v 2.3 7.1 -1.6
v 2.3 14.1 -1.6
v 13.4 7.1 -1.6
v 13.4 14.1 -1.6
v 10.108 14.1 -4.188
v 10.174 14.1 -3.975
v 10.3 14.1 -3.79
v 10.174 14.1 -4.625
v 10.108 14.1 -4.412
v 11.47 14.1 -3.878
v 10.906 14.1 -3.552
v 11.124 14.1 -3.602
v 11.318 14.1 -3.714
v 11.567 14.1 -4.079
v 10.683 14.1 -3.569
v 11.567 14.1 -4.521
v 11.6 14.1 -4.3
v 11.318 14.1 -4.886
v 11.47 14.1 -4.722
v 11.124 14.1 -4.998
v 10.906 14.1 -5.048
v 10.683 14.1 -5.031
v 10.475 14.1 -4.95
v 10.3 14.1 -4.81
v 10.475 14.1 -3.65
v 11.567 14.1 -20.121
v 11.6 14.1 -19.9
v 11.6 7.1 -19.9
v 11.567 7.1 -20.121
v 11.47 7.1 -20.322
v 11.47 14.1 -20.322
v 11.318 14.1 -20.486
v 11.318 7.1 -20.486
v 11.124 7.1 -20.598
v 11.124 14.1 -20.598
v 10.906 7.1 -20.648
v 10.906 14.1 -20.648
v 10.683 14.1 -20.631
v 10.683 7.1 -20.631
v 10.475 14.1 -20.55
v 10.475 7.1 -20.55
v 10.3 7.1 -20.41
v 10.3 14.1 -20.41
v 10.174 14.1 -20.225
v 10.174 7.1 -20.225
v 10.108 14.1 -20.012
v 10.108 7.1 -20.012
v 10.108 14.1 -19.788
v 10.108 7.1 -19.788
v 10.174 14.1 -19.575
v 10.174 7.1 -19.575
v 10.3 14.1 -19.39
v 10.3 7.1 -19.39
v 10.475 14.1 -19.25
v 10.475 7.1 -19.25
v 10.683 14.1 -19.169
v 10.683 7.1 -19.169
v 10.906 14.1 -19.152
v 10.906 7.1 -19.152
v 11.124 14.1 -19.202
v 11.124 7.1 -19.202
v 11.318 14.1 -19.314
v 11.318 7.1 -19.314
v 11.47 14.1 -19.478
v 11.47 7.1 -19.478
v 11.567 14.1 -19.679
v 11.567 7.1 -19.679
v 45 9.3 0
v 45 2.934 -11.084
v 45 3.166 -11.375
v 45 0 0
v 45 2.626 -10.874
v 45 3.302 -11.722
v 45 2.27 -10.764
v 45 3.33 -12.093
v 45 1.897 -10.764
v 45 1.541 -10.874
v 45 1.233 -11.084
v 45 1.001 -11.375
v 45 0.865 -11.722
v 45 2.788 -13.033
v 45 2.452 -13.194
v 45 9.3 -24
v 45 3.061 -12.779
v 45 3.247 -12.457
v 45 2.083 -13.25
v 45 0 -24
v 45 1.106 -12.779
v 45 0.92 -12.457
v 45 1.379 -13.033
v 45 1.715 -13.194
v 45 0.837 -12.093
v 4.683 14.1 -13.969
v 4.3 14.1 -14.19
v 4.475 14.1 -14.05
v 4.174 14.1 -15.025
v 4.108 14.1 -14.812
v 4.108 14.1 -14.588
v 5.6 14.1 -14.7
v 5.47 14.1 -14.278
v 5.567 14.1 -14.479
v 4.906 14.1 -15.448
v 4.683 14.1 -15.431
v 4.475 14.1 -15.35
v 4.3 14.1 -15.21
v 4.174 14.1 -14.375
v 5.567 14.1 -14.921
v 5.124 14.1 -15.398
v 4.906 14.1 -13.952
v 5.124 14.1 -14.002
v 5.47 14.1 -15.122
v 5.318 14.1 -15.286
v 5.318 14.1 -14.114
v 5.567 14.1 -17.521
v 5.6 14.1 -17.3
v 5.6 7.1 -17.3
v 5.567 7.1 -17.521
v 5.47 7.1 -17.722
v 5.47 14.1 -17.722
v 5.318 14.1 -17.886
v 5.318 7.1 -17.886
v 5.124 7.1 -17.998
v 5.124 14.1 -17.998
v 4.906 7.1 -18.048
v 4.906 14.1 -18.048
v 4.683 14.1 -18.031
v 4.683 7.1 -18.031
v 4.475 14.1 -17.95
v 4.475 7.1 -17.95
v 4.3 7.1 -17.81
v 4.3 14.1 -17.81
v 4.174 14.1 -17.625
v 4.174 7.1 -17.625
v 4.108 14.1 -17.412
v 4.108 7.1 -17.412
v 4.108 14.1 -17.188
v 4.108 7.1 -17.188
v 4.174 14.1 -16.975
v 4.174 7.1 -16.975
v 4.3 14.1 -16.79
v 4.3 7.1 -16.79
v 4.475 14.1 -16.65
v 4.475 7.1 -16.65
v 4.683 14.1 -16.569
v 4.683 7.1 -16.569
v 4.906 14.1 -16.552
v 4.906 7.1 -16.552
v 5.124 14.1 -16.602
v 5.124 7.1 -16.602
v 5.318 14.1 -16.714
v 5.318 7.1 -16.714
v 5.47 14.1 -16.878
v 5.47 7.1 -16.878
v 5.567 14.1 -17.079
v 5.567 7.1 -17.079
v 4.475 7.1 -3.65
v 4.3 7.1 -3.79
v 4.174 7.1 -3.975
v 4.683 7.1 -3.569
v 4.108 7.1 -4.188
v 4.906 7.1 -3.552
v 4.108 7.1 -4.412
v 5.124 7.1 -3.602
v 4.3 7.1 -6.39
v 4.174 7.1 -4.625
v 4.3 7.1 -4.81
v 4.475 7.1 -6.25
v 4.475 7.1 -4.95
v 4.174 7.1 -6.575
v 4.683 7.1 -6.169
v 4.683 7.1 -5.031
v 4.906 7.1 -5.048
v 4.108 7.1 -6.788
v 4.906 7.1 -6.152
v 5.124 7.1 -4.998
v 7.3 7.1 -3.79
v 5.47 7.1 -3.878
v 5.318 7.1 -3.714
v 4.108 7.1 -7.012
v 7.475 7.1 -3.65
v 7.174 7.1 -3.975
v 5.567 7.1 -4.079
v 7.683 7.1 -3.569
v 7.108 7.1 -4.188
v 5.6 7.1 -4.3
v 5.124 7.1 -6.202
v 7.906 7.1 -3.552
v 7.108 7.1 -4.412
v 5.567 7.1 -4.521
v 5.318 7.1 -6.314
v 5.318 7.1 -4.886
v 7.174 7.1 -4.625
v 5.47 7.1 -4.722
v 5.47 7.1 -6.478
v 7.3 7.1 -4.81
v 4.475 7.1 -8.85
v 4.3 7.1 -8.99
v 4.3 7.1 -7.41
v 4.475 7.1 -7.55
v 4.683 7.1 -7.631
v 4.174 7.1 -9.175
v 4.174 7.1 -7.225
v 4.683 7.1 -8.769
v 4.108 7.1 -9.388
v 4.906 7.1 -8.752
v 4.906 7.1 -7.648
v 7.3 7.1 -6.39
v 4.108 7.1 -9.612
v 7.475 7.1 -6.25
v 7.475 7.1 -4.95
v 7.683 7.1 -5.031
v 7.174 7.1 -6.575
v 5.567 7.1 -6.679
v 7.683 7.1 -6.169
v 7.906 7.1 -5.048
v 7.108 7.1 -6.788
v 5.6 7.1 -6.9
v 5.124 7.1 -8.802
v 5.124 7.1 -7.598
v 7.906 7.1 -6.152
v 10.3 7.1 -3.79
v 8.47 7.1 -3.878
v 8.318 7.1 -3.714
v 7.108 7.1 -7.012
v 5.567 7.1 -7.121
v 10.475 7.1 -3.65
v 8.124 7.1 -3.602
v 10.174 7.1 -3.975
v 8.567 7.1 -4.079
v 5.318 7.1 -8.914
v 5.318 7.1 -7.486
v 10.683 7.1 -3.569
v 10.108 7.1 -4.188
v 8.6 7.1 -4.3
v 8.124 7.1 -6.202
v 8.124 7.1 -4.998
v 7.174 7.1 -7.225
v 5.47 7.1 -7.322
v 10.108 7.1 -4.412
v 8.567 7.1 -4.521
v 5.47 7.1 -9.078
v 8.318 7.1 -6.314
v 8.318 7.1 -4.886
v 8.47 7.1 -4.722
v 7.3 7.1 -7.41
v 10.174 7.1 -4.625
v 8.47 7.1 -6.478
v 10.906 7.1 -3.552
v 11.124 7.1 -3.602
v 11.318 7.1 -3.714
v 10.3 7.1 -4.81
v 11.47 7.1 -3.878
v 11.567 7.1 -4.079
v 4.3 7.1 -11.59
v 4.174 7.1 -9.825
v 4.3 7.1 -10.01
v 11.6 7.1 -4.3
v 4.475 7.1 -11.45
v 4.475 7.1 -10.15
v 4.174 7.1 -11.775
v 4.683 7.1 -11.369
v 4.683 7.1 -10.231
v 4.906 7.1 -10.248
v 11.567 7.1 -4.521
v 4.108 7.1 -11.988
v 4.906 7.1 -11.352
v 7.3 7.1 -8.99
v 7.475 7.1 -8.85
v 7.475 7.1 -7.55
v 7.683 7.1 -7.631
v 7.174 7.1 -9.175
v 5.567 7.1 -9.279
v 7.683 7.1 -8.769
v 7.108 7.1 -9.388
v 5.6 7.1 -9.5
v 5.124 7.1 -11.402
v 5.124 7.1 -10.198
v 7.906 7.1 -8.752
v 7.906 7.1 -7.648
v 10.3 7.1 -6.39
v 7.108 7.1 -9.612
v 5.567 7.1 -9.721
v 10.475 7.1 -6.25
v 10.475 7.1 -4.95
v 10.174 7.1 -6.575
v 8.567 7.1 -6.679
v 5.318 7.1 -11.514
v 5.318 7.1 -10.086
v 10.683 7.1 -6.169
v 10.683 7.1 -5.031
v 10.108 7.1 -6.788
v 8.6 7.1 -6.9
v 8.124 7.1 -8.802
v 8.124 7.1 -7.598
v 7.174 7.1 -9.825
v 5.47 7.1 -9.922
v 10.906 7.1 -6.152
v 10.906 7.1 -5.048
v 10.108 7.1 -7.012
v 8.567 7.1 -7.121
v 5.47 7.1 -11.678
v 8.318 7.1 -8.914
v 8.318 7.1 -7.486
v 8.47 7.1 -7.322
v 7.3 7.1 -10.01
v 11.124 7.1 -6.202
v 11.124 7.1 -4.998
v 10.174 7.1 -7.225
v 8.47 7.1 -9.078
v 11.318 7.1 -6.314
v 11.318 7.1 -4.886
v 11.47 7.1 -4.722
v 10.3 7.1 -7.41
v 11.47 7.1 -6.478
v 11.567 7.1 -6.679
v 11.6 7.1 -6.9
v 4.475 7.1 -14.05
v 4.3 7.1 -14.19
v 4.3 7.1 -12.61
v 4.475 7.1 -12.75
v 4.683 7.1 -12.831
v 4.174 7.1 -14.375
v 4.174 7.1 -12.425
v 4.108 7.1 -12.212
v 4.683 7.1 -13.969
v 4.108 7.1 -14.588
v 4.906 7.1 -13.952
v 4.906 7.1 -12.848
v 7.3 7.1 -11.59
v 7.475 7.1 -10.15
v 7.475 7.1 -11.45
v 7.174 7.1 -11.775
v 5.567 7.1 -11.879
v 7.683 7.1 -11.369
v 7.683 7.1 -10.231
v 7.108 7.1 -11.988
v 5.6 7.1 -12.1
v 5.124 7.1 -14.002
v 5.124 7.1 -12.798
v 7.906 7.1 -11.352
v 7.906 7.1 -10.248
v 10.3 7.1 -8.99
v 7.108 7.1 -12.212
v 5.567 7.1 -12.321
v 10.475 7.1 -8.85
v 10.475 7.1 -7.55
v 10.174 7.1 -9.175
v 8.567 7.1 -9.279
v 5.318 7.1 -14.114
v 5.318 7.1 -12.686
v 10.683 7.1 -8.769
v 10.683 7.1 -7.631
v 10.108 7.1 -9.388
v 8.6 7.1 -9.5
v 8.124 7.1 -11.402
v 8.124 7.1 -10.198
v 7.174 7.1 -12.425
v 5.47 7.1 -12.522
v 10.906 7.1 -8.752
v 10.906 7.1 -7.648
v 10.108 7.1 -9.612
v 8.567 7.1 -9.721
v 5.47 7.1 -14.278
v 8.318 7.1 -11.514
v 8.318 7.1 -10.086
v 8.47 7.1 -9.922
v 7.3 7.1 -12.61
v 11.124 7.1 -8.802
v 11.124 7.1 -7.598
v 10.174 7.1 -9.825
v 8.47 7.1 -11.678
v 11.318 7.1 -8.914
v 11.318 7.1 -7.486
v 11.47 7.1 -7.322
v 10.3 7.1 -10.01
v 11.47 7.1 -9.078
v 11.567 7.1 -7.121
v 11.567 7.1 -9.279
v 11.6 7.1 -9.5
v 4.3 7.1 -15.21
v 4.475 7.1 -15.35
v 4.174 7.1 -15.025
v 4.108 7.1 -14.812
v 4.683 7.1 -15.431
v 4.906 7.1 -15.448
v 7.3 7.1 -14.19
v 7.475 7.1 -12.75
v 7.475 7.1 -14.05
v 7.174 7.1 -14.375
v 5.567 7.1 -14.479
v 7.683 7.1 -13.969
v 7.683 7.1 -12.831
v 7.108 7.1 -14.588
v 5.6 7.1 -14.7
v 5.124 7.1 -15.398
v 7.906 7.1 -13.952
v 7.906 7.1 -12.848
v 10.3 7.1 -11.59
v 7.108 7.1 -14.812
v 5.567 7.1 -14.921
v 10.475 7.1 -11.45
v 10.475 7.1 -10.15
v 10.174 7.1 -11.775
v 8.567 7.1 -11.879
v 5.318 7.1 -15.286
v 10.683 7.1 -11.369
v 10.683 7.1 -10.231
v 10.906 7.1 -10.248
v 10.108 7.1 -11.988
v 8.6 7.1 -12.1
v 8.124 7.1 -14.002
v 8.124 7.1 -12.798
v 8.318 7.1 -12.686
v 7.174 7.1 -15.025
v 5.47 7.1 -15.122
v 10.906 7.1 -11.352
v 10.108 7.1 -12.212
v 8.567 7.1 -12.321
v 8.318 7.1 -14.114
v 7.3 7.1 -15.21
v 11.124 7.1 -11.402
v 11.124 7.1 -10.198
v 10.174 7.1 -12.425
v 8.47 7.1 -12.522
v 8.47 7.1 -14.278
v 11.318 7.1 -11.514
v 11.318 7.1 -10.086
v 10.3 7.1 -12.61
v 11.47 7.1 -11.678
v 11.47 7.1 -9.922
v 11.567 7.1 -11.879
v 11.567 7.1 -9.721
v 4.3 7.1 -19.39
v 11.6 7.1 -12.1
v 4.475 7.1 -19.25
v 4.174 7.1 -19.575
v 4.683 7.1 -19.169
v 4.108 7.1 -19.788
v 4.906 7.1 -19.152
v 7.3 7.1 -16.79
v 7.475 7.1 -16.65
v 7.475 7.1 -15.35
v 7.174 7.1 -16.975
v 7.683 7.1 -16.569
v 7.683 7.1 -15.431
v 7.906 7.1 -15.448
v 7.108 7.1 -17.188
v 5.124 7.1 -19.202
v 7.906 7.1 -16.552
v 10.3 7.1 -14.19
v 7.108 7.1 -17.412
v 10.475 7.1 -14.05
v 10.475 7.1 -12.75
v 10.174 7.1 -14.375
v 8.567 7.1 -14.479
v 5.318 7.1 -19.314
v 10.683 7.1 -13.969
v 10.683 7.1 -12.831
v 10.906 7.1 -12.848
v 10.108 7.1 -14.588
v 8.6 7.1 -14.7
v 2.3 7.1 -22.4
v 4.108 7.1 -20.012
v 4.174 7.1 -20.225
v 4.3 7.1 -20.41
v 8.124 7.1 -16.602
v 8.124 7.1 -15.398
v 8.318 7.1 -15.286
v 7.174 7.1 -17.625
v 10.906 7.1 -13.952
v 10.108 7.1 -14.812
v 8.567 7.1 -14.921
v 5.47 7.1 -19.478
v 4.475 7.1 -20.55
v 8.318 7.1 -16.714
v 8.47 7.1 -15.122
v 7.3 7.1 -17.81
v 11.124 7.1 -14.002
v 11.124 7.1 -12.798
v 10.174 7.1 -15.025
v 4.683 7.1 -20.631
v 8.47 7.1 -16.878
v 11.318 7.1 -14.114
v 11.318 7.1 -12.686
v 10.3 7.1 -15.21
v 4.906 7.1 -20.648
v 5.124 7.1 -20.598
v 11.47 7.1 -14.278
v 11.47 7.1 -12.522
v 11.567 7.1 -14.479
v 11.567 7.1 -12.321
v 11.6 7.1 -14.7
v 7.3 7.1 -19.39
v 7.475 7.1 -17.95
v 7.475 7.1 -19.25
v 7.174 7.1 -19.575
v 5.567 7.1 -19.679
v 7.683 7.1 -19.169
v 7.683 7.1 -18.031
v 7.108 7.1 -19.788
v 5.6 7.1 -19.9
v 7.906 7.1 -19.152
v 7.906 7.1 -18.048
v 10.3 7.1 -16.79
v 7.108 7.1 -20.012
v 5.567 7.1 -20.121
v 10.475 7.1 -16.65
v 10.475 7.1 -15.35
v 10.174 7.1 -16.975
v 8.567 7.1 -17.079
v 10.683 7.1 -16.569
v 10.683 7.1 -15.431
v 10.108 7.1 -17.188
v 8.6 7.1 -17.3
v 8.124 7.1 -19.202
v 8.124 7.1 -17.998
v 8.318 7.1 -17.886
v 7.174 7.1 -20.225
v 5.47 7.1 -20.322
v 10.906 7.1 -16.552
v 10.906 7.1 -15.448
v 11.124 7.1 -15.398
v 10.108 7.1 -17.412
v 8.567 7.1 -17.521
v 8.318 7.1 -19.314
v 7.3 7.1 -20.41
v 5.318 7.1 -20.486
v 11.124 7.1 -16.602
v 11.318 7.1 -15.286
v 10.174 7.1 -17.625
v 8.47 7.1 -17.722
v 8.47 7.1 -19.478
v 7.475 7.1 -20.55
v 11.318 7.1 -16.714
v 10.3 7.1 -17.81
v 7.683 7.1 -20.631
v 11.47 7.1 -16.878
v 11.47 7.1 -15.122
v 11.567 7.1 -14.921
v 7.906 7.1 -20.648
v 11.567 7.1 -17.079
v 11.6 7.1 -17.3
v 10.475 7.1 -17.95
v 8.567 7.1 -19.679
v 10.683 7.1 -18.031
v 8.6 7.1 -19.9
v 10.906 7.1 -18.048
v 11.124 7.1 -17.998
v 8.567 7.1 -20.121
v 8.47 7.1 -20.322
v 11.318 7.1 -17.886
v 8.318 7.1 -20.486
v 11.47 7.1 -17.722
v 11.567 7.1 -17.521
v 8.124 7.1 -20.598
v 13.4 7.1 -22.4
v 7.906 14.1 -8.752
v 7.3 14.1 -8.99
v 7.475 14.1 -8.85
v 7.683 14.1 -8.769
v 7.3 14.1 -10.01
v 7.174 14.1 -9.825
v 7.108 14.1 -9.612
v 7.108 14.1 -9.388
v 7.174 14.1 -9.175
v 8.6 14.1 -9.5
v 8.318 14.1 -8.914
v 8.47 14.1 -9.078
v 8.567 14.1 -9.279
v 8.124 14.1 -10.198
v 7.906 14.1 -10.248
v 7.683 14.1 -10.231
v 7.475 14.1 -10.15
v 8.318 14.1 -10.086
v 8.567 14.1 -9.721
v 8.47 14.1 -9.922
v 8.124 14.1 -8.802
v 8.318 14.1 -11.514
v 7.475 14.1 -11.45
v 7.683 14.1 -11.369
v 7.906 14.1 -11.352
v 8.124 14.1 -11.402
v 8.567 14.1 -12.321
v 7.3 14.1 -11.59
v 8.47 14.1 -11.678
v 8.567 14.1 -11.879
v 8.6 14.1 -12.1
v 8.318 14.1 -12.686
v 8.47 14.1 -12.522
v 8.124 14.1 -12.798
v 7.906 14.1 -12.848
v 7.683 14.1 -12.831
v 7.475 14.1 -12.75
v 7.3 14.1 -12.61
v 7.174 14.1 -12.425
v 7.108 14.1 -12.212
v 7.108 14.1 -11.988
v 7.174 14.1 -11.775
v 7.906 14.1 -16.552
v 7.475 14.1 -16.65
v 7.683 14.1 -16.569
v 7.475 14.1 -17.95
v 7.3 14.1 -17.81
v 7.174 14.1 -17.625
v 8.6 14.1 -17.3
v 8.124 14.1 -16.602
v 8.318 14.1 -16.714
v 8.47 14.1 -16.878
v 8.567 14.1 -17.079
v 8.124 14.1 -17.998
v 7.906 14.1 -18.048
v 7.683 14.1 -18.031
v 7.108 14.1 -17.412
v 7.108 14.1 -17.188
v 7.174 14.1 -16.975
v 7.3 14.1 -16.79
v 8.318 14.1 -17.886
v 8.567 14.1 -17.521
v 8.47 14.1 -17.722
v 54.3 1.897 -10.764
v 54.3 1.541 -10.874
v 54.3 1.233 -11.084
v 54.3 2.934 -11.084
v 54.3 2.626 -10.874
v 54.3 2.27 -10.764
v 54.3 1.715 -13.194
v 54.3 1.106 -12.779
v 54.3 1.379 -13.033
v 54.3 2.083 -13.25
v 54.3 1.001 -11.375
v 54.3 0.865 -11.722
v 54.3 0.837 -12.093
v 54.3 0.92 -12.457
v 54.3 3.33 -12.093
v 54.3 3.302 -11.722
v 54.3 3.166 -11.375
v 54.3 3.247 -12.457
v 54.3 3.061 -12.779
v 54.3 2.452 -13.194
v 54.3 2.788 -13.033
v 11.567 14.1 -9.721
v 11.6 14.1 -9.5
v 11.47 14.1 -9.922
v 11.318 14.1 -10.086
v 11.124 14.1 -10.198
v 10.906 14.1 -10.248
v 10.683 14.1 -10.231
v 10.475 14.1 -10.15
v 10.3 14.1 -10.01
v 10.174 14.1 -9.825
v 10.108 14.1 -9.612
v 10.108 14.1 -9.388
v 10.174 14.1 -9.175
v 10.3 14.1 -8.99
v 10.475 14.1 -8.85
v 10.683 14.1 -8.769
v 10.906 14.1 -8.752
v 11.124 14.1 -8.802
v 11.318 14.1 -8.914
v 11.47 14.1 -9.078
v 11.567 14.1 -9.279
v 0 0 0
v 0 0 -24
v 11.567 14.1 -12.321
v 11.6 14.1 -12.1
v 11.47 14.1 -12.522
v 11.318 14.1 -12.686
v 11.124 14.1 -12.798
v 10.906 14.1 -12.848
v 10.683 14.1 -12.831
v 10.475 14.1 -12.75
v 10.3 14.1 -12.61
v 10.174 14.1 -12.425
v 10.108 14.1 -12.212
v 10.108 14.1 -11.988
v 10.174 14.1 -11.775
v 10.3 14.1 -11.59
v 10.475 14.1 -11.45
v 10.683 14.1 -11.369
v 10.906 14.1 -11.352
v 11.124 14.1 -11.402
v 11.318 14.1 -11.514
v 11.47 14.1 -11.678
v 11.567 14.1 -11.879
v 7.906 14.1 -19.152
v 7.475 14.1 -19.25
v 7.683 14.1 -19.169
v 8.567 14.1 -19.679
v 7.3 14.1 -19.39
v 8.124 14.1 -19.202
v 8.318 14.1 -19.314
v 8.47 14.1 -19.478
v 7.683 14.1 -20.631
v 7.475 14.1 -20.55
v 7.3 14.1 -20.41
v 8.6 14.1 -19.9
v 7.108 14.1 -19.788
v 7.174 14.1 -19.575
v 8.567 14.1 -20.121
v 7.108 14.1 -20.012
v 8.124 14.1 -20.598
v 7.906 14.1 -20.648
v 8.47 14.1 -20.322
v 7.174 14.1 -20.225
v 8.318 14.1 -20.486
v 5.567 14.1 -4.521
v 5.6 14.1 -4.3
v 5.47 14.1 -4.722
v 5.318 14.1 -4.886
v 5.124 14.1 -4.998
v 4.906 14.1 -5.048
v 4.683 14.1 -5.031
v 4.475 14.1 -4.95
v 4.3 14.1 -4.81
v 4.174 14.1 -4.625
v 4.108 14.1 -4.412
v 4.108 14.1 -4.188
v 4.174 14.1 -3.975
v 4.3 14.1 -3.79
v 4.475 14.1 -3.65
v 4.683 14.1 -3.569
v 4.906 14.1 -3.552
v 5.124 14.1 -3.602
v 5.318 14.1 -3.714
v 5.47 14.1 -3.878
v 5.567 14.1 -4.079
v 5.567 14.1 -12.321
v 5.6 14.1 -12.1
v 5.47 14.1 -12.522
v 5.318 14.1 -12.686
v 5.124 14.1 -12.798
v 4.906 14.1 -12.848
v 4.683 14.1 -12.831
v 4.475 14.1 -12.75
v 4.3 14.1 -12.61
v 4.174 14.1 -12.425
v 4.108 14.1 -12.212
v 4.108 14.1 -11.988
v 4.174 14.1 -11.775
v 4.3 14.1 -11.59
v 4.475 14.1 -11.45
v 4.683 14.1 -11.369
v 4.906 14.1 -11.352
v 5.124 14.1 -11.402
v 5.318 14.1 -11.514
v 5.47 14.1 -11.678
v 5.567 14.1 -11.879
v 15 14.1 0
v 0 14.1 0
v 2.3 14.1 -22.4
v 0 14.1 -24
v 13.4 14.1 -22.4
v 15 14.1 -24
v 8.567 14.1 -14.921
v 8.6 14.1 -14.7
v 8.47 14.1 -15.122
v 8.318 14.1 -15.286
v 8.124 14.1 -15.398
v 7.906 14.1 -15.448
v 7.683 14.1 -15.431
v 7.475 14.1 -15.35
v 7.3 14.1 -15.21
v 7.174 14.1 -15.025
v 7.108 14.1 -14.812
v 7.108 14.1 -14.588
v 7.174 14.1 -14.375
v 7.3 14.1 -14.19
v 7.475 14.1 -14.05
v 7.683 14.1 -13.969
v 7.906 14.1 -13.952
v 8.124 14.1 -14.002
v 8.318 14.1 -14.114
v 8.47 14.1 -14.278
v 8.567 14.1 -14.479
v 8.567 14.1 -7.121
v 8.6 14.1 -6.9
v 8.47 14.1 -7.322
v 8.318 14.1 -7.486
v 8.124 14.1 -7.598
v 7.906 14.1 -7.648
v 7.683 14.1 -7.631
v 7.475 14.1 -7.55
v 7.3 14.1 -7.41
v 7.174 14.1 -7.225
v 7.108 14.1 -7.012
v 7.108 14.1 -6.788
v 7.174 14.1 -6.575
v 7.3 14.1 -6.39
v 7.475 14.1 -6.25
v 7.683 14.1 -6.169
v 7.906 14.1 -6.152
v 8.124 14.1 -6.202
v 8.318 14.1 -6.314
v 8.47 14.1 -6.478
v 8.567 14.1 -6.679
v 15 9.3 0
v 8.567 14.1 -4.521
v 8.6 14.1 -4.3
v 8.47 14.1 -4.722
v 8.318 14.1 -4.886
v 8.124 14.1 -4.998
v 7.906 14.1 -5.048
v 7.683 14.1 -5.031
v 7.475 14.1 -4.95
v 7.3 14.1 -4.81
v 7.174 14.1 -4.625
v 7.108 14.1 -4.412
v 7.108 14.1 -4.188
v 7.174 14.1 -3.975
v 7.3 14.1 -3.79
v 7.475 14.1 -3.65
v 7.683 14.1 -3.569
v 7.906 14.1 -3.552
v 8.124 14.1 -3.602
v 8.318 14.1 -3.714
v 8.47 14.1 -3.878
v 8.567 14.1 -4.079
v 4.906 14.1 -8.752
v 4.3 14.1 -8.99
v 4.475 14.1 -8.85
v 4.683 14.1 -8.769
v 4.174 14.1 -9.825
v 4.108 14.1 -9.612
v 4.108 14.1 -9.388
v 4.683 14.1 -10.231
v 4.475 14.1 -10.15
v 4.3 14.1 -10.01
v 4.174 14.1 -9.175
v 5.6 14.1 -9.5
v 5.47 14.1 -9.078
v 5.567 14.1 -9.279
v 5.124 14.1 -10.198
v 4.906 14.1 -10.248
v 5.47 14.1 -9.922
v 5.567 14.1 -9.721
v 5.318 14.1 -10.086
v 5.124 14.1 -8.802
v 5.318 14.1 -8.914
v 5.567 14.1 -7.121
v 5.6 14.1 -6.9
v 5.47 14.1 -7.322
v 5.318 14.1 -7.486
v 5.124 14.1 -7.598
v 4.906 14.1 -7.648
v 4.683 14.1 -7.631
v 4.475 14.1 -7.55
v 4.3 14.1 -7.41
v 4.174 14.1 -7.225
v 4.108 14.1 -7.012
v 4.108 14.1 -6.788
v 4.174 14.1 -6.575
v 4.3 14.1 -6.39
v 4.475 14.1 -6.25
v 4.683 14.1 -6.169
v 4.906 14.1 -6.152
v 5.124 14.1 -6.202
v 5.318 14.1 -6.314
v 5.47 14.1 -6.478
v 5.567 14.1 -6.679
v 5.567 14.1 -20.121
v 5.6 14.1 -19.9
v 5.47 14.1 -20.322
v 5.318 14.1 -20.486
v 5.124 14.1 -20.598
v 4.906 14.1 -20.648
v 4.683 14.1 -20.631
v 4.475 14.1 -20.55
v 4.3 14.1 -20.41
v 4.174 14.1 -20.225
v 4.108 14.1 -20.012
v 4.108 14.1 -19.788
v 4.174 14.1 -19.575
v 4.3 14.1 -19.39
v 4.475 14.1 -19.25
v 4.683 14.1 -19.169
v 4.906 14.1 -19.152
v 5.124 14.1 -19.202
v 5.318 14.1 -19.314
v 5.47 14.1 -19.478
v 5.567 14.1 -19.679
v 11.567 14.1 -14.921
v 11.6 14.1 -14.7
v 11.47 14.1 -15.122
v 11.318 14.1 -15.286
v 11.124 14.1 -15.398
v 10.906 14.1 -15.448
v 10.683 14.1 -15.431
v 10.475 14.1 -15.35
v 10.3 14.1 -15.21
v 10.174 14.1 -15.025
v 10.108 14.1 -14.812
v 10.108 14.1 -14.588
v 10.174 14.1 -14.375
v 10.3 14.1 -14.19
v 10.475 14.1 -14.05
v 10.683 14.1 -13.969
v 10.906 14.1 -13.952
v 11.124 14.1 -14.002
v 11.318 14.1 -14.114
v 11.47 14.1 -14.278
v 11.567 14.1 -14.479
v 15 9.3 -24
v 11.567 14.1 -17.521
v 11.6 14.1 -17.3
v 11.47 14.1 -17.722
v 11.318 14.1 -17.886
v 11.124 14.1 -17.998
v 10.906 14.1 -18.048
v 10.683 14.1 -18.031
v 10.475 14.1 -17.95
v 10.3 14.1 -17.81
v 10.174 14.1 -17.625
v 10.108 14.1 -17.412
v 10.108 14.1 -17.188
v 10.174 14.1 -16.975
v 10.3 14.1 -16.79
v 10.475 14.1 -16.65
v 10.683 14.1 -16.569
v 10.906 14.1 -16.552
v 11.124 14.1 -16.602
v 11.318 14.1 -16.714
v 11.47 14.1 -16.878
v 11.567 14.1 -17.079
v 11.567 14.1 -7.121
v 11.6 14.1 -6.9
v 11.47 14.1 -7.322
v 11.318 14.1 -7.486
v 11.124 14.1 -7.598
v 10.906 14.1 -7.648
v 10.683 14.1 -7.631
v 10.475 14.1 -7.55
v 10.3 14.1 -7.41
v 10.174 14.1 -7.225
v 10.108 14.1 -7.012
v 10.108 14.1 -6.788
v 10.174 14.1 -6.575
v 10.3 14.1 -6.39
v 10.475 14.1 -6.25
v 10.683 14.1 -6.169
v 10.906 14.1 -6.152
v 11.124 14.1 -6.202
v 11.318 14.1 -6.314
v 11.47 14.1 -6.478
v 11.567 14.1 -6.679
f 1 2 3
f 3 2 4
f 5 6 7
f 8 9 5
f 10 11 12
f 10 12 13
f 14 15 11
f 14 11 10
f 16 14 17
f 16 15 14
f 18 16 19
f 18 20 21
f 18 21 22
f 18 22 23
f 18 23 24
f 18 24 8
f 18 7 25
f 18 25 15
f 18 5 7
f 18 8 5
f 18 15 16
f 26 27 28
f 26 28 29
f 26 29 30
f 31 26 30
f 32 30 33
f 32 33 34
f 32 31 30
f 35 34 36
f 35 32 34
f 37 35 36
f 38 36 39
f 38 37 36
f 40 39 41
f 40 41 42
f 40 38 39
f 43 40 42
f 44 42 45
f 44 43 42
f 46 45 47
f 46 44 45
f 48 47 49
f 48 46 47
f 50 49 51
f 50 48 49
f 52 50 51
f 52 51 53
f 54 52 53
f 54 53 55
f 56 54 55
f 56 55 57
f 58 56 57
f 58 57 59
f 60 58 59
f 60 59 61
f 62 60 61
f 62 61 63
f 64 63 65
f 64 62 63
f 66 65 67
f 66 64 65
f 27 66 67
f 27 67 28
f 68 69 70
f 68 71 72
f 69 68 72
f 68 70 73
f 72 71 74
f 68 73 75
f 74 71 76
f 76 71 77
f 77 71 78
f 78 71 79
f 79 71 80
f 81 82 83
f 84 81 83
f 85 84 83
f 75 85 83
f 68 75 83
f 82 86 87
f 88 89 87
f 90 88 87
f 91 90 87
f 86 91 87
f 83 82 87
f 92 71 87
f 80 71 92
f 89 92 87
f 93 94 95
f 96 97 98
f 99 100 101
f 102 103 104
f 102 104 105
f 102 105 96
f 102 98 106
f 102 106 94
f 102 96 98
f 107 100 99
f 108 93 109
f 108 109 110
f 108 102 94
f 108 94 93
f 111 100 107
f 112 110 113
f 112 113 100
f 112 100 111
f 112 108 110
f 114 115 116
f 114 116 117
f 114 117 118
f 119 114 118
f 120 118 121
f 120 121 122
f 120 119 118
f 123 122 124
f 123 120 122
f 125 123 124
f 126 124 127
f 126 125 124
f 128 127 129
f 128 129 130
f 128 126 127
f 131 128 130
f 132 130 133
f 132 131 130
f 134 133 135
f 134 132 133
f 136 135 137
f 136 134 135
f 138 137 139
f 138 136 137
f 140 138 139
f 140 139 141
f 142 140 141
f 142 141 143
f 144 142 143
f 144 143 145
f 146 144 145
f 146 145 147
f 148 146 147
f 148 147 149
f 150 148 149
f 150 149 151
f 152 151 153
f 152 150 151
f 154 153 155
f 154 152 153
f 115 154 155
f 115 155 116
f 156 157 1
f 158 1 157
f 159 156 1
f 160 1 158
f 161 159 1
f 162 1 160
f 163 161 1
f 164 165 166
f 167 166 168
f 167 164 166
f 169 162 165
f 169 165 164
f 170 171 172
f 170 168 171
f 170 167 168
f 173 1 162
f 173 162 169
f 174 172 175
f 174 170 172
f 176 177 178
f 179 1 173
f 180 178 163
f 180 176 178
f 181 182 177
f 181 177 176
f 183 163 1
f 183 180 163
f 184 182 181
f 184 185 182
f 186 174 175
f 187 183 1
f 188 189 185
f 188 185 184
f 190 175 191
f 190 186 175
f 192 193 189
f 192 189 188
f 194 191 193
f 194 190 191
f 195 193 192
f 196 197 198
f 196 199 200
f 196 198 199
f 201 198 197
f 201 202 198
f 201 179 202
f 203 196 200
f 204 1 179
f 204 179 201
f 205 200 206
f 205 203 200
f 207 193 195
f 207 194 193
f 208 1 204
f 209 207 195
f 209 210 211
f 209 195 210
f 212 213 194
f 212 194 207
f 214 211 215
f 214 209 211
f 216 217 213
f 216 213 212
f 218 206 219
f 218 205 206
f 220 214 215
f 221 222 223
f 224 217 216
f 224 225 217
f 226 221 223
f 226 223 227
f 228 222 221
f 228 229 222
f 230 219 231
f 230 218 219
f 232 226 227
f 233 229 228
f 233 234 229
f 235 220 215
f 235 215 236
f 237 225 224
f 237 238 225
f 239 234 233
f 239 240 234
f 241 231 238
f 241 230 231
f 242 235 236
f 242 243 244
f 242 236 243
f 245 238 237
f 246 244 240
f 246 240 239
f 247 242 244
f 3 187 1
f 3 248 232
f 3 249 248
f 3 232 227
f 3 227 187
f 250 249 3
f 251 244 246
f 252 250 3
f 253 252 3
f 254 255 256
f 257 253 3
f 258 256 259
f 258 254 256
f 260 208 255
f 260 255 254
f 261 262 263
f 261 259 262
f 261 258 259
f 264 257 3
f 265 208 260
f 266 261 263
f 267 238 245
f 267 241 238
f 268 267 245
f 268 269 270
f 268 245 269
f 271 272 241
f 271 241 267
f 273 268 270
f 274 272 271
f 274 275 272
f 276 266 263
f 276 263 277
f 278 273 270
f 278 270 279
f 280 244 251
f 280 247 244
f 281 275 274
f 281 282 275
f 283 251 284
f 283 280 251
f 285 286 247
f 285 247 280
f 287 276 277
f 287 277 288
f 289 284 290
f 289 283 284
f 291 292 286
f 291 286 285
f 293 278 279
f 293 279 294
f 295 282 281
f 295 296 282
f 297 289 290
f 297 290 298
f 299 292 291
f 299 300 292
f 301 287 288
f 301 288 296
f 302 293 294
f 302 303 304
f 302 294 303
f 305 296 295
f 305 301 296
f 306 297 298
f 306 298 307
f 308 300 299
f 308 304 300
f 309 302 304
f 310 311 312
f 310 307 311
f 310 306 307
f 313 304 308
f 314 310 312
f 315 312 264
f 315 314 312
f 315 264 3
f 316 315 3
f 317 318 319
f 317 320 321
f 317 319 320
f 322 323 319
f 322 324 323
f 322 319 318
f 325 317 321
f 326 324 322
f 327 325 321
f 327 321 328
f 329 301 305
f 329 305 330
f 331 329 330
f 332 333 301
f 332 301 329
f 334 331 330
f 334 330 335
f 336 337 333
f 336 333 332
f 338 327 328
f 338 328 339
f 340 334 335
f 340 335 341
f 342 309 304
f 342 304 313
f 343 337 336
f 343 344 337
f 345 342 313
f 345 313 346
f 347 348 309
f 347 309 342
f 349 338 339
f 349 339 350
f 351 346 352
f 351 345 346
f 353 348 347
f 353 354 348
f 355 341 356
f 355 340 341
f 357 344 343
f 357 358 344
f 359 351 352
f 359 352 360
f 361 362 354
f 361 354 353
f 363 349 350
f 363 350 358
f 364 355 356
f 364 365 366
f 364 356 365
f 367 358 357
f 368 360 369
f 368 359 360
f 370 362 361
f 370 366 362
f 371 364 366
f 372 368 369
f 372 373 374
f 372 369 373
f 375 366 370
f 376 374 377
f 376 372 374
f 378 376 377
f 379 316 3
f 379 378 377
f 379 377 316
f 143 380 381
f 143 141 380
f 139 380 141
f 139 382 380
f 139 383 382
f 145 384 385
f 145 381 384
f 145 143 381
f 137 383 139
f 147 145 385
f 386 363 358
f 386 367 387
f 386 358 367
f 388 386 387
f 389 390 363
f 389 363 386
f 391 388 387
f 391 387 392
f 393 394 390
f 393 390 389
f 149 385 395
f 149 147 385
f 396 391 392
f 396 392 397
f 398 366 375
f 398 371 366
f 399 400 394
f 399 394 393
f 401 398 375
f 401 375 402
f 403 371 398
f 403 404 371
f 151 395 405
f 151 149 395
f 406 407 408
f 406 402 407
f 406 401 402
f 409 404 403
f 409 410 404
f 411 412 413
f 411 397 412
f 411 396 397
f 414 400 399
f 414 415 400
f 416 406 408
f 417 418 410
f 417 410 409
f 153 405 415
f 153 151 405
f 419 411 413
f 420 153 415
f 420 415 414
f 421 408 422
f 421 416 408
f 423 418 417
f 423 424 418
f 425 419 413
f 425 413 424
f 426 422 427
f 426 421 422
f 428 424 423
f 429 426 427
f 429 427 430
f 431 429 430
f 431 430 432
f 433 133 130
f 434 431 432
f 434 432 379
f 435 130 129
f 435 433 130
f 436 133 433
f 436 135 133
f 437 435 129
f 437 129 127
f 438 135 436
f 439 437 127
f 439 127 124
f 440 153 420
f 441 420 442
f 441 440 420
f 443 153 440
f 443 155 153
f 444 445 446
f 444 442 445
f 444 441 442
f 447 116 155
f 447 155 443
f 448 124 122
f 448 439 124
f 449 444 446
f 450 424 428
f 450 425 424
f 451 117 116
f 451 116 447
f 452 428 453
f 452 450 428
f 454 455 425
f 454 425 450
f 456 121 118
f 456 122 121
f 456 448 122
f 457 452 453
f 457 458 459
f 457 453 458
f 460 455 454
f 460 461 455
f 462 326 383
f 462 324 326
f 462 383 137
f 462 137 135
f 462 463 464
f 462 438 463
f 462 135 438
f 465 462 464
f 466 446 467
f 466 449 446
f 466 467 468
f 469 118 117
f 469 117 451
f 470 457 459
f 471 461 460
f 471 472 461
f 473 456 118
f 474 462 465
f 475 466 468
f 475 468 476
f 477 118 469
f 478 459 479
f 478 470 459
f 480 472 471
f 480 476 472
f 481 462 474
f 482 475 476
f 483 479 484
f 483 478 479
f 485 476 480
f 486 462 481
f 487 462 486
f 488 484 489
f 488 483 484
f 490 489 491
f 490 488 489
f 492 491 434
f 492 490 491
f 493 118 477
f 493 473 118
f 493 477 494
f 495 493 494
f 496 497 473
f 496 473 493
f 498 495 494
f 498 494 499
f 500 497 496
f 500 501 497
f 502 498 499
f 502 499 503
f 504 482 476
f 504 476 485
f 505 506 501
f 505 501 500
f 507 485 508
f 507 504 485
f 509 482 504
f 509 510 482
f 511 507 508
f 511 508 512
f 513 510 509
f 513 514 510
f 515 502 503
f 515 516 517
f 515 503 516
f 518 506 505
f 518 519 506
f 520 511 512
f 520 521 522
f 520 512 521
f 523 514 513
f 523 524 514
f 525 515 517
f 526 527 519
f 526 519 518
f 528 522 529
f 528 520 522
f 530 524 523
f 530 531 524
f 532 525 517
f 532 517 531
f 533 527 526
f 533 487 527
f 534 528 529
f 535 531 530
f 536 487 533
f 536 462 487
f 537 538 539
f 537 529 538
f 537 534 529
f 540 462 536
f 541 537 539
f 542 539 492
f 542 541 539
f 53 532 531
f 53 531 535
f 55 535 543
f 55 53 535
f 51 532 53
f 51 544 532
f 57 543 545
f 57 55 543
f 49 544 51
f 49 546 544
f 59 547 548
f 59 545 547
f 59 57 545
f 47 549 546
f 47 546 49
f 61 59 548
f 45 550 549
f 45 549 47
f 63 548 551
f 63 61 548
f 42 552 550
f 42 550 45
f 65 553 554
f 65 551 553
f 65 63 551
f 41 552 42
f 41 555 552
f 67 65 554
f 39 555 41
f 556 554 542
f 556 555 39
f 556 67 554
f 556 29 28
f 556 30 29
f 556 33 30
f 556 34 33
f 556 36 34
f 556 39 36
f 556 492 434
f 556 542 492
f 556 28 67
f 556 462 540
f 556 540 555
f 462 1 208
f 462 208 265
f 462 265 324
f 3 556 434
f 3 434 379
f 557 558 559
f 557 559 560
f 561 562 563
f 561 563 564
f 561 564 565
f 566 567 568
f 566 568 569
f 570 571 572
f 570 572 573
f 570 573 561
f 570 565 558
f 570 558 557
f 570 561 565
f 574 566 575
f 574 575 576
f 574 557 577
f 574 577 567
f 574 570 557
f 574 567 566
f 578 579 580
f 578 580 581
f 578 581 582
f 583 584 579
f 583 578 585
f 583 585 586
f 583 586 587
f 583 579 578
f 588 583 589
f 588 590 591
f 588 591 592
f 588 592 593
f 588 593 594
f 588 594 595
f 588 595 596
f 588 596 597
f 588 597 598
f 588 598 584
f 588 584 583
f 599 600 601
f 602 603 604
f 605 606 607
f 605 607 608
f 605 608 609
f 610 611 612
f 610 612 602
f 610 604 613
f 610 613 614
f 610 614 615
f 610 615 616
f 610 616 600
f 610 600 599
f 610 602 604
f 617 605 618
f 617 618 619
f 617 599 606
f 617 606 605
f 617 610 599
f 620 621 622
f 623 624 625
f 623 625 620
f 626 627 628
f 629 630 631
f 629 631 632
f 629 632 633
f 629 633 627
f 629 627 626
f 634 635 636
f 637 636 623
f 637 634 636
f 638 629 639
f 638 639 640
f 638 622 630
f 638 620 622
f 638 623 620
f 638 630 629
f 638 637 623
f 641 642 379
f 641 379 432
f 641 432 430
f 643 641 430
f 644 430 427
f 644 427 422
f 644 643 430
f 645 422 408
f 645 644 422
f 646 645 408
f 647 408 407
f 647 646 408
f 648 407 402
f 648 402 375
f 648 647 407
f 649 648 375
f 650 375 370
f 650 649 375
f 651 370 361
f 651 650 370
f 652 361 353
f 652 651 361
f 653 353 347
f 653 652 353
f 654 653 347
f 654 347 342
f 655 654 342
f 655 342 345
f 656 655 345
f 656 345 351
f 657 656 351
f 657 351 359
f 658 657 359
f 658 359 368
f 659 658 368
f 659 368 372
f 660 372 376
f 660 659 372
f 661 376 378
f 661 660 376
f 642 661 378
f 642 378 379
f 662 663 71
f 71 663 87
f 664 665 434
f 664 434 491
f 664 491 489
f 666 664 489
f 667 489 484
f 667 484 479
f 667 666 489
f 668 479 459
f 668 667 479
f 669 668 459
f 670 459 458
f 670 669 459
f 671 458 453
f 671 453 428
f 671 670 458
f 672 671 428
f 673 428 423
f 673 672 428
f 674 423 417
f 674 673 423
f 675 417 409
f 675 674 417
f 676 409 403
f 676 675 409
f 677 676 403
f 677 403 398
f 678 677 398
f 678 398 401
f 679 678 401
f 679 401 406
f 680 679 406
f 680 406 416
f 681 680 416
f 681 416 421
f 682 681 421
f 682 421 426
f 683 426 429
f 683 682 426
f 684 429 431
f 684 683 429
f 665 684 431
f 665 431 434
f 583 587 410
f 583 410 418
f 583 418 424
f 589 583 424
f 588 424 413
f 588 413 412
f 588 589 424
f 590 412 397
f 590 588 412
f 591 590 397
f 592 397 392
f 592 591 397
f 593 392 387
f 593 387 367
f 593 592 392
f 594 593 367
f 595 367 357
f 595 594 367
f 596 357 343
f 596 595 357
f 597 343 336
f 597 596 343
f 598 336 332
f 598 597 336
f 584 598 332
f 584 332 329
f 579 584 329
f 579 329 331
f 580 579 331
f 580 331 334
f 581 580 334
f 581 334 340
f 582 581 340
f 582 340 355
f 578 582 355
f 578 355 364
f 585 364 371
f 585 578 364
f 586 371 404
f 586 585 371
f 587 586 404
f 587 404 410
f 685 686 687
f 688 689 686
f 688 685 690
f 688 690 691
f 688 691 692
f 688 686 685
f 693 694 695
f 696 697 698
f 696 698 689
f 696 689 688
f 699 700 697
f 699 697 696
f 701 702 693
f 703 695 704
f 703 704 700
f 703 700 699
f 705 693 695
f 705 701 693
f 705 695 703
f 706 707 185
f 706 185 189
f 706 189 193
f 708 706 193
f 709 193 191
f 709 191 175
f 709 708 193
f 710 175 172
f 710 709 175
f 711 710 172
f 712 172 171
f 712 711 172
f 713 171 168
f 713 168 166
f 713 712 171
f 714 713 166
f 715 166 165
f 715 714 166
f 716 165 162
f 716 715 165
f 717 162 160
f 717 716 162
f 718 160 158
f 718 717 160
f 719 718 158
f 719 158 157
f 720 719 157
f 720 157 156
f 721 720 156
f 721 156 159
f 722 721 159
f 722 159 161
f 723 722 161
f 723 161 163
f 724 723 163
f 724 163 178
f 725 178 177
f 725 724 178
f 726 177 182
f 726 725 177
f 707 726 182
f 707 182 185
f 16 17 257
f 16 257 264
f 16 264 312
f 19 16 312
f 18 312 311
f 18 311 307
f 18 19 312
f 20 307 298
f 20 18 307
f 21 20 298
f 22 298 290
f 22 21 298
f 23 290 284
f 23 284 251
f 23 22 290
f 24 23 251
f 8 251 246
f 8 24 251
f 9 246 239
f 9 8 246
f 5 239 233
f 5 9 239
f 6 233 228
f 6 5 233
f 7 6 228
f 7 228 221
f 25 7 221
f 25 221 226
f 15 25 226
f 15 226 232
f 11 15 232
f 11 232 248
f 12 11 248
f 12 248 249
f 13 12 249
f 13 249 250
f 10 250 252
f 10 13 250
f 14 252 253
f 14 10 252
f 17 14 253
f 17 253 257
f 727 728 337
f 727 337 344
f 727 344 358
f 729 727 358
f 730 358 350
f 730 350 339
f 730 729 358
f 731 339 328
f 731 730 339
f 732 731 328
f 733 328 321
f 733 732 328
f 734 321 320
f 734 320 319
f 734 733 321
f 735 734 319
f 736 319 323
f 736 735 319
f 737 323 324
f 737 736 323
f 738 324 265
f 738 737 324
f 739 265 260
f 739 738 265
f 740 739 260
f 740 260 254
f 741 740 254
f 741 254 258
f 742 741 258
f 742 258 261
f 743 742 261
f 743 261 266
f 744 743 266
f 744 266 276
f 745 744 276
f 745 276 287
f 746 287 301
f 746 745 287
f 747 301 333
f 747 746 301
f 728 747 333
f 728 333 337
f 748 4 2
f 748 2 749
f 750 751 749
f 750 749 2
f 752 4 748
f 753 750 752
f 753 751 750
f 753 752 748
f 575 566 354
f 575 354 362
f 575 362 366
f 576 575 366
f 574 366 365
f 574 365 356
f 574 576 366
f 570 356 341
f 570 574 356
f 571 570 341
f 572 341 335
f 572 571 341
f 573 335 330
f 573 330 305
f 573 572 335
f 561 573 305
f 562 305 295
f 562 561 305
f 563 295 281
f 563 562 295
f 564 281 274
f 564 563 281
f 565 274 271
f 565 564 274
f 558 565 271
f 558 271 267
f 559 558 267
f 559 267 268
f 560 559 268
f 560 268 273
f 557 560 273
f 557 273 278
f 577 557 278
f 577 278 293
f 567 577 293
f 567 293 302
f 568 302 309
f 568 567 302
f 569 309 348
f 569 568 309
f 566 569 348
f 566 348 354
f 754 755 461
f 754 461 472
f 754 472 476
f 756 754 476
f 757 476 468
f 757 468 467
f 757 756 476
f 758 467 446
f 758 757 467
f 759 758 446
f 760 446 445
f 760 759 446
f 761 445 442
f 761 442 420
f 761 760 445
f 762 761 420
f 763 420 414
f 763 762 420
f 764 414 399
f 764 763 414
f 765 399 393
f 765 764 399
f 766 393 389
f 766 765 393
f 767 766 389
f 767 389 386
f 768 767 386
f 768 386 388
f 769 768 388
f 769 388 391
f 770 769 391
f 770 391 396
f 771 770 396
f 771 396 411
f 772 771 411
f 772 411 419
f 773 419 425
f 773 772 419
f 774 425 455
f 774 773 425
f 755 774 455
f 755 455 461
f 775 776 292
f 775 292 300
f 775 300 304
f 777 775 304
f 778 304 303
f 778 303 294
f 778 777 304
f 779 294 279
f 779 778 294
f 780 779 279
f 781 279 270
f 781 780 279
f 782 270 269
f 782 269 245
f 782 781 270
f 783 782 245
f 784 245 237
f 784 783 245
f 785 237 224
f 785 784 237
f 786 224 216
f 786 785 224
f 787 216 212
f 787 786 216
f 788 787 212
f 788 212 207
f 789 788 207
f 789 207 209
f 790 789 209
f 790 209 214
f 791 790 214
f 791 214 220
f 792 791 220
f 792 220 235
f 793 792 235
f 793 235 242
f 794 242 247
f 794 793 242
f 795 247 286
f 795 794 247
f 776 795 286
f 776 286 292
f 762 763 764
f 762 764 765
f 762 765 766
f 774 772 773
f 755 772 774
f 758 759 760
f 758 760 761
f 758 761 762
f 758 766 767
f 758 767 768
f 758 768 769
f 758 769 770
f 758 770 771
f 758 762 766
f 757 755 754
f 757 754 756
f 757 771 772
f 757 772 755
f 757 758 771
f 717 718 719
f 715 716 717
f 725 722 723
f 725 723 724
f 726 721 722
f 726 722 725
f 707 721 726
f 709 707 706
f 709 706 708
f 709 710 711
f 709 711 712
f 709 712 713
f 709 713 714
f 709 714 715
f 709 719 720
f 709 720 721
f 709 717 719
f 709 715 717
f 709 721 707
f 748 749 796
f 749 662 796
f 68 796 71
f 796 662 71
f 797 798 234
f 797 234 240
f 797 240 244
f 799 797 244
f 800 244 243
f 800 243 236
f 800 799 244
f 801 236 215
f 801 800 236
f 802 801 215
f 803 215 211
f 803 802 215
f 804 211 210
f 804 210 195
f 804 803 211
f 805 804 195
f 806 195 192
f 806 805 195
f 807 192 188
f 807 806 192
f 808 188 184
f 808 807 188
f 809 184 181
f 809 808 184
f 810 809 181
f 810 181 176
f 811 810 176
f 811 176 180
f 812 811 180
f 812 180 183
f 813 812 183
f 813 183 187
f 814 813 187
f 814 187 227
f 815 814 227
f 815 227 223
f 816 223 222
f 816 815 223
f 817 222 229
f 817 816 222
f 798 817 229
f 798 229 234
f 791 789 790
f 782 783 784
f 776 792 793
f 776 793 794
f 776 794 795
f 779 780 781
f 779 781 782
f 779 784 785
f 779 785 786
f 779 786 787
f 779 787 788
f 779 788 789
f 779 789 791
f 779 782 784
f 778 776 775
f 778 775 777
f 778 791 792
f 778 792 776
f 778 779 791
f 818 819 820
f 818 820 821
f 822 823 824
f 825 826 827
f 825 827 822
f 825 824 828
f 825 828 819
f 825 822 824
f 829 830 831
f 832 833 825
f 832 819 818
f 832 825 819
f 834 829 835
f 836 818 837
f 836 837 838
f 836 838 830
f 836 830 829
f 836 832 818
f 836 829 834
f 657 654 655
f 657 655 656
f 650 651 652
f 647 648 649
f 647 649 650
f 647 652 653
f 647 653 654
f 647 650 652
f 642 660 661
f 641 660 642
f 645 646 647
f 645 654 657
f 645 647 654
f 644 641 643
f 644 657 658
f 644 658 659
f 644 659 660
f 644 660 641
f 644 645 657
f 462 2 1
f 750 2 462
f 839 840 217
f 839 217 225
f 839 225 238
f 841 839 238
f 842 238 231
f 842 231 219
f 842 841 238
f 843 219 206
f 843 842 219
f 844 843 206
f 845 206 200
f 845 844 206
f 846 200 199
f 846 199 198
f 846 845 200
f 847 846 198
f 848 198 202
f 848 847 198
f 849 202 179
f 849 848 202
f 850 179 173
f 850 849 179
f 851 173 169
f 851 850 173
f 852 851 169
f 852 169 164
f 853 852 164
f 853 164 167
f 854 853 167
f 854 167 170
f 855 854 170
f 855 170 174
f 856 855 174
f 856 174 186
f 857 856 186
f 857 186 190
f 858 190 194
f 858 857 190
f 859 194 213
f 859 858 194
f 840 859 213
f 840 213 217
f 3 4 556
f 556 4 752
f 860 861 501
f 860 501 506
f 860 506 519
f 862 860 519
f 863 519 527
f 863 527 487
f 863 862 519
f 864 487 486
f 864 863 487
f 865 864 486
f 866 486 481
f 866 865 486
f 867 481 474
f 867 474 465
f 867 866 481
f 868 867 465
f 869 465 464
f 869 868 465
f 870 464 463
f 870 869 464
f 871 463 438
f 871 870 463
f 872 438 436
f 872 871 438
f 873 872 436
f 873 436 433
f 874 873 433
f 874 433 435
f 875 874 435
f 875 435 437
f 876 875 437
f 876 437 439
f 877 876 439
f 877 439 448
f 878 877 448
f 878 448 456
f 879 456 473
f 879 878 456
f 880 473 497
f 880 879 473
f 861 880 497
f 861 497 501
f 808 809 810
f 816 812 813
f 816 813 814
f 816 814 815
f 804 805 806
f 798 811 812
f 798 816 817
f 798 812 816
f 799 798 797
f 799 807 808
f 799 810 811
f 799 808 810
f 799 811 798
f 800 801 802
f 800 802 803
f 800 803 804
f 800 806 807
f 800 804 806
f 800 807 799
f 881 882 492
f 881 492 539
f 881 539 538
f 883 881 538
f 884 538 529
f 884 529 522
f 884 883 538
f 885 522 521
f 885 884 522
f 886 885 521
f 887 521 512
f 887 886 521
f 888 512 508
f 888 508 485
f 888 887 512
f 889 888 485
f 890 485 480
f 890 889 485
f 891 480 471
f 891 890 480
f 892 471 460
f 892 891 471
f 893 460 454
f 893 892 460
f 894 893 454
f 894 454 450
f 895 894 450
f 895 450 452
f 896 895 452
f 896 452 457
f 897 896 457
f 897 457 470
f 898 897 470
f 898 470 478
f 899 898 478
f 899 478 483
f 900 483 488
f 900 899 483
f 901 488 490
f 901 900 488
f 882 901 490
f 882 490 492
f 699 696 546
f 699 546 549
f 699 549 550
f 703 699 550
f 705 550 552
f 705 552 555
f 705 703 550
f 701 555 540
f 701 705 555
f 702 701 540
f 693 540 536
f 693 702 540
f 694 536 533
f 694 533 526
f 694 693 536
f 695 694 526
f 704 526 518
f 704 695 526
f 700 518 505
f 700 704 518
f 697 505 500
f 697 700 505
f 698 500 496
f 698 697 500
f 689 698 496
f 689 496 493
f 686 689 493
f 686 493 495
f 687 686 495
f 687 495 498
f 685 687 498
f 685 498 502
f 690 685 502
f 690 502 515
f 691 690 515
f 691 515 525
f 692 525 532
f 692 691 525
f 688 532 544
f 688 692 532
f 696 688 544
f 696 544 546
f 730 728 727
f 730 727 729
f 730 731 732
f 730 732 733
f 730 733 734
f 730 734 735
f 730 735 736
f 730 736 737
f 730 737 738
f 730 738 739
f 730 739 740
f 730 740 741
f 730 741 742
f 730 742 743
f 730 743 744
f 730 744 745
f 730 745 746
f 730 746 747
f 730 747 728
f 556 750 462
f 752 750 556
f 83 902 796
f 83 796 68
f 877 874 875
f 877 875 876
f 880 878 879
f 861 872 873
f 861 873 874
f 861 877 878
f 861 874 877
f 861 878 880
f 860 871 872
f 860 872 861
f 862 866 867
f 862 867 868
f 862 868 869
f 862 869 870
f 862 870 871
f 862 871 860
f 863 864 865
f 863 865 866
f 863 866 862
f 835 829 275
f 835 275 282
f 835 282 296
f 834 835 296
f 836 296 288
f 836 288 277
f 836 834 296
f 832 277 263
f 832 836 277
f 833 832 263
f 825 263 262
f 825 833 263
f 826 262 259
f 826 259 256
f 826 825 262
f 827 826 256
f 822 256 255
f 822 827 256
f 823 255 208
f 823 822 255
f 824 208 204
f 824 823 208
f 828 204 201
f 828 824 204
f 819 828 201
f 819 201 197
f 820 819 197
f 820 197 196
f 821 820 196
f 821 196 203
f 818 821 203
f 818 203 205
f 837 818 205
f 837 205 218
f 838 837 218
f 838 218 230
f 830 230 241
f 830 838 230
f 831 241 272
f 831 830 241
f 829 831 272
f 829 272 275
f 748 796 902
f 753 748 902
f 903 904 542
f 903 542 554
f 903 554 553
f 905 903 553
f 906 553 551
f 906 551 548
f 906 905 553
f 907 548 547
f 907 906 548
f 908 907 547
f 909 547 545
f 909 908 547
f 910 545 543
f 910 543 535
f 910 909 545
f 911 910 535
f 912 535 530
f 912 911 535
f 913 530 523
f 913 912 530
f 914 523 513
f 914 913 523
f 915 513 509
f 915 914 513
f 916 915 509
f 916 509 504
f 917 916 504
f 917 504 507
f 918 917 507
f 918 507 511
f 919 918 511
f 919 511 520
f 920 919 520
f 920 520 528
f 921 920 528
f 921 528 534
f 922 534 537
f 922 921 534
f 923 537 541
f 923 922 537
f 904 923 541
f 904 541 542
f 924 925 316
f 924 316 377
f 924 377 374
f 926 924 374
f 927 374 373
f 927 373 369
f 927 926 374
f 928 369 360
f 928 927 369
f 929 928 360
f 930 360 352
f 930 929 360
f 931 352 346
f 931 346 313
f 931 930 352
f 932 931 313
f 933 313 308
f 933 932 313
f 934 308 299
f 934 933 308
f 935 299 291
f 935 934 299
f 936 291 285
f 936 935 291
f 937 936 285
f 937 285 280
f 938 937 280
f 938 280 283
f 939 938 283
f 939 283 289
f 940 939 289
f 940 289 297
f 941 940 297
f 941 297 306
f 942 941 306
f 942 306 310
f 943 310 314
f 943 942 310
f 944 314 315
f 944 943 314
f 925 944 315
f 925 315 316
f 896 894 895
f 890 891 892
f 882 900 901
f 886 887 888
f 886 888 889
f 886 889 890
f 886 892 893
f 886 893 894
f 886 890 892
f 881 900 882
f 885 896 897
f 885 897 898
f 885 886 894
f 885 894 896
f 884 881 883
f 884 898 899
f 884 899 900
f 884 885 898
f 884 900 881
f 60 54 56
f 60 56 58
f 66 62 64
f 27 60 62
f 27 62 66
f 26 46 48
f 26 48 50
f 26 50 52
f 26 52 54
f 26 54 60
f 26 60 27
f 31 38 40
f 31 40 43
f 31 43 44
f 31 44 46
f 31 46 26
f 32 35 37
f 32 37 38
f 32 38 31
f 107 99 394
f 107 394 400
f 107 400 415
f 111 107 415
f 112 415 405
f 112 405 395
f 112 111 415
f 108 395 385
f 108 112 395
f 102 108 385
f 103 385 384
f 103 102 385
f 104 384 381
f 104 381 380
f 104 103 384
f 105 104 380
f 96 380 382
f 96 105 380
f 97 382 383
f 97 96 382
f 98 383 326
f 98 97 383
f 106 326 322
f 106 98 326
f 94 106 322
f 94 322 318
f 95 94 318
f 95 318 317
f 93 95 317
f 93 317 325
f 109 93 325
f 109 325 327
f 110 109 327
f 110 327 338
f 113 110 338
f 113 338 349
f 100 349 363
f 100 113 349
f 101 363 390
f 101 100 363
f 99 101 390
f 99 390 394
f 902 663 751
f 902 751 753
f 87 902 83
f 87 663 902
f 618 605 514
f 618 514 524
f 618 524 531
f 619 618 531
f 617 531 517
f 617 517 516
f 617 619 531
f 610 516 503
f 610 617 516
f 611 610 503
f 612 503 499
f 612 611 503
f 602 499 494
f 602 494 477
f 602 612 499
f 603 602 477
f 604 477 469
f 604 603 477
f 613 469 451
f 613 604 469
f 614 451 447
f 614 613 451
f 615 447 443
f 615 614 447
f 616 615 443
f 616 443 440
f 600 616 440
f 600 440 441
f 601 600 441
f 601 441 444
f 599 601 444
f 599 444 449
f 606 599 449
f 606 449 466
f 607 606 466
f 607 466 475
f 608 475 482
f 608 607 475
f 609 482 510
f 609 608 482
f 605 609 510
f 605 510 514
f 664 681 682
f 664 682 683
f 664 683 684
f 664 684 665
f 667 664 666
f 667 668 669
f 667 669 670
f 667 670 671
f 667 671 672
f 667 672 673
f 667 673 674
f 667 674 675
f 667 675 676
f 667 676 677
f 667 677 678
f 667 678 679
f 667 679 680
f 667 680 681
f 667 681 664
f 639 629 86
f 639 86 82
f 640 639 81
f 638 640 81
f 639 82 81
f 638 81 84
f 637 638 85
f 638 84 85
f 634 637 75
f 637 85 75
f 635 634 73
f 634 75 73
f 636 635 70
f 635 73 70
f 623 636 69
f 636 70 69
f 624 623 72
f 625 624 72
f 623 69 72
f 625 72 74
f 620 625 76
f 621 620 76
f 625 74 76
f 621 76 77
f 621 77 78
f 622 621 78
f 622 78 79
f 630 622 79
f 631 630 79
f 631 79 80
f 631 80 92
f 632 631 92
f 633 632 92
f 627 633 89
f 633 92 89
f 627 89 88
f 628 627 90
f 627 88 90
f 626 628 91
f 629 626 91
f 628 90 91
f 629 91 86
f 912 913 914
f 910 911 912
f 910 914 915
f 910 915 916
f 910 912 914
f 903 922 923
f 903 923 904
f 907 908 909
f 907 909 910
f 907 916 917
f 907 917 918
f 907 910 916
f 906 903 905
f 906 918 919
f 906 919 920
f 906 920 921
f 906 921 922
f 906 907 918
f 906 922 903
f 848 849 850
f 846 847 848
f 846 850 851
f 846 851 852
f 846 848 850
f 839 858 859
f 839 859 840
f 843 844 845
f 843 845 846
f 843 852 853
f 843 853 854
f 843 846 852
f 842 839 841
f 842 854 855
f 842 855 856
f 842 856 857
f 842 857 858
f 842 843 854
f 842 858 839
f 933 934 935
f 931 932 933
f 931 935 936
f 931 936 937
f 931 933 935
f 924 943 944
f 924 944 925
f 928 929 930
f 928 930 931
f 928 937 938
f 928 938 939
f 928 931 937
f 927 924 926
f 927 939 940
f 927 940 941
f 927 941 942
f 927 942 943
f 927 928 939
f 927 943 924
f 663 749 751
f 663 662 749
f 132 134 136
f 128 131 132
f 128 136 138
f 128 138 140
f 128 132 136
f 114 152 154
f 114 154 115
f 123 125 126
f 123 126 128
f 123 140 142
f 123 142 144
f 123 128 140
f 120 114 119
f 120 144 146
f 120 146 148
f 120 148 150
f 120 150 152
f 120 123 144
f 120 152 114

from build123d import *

# Parameters (mm, degrees)
SKETCH1_W           = 45
SKETCH1_H           = 24
BOSS_EXTRUDE1_DEPTH = 9.3
SKETCH2_R           = 1.25
BOSS_EXTRUDE2_DEPTH = 9.3
SKETCH3_W           = 15
SKETCH3_H           = 24
BOSS_EXTRUDE3_DEPTH = 4.8
SKETCH4_W           = 11.1
SKETCH4_H           = 20.8
SKETCH4_R           = 0.75
CUT_EXTRUDE1_DEPTH  = 7


with BuildPart() as part:
    # Sketch1 → Boss-Extrude1 (new body)
    with BuildSketch(Plane(origin=(0, 0, 0), x_dir=(1, 0, 0), z_dir=(0, 1, 0))):
        with Locations((22.5, 12)):
            Rectangle(SKETCH1_W, SKETCH1_H)
    extrude(amount=BOSS_EXTRUDE1_DEPTH)

    # Sketch2 → Boss-Extrude2 (add)
    with BuildSketch(Plane(origin=(45, 0, 0), x_dir=(0, 0, -1), z_dir=(1, 0, 0))):
        with Locations((12, 2.083449871)):
            Circle(SKETCH2_R)
    extrude(amount=BOSS_EXTRUDE2_DEPTH)

    # Sketch3 → Boss-Extrude3 (add)
    with BuildSketch(Plane(origin=(0, 9.3, 0), x_dir=(1, 0, 0), z_dir=(0, 1, 0))):
        with Locations((7.5, 12)):
            Rectangle(SKETCH3_W, SKETCH3_H)
    extrude(amount=BOSS_EXTRUDE3_DEPTH)

    # Sketch4 → Cut-Extrude1 (cut)
    with BuildSketch(Plane(origin=(0, 14.1, 0), x_dir=(1, 0, 0), z_dir=(0, 1, 0))):
        with Locations((7.85, 12)):
            Rectangle(SKETCH4_W, SKETCH4_H)
        with Locations((4.85, 19.9)):
            Circle(SKETCH4_R, mode=Mode.SUBTRACT)
        with Locations((7.85, 19.9)):
            Circle(SKETCH4_R, mode=Mode.SUBTRACT)
        with Locations((10.85, 19.9)):
            Circle(SKETCH4_R, mode=Mode.SUBTRACT)
        with Locations((4.85, 17.3)):
            Circle(SKETCH4_R, mode=Mode.SUBTRACT)
        with Locations((7.85, 17.3)):
            Circle(SKETCH4_R, mode=Mode.SUBTRACT)
        with Locations((10.85, 17.3)):
            Circle(SKETCH4_R, mode=Mode.SUBTRACT)
        with Locations((4.85, 14.7)):
            Circle(SKETCH4_R, mode=Mode.SUBTRACT)
        with Locations((7.85, 14.7)):
            Circle(SKETCH4_R, mode=Mode.SUBTRACT)
        with Locations((10.85, 14.7)):
            Circle(SKETCH4_R, mode=Mode.SUBTRACT)
        with Locations((4.85, 12.1)):
            Circle(SKETCH4_R, mode=Mode.SUBTRACT)
        with Locations((7.85, 12.1)):
            Circle(SKETCH4_R, mode=Mode.SUBTRACT)
        with Locations((10.85, 12.1)):
            Circle(SKETCH4_R, mode=Mode.SUBTRACT)
        with Locations((4.85, 9.5)):
            Circle(SKETCH4_R, mode=Mode.SUBTRACT)
        with Locations((7.85, 9.5)):
            Circle(SKETCH4_R, mode=Mode.SUBTRACT)
        with Locations((10.85, 9.5)):
            Circle(SKETCH4_R, mode=Mode.SUBTRACT)
        with Locations((4.85, 6.9)):
            Circle(SKETCH4_R, mode=Mode.SUBTRACT)
        with Locations((7.85, 6.9)):
            Circle(SKETCH4_R, mode=Mode.SUBTRACT)
        with Locations((10.85, 6.9)):
            Circle(SKETCH4_R, mode=Mode.SUBTRACT)
        with Locations((4.85, 4.3)):
            Circle(SKETCH4_R, mode=Mode.SUBTRACT)
        with Locations((7.85, 4.3)):
            Circle(SKETCH4_R, mode=Mode.SUBTRACT)
        with Locations((10.85, 4.3)):
            Circle(SKETCH4_R, mode=Mode.SUBTRACT)
    extrude(amount=-CUT_EXTRUDE1_DEPTH, mode=Mode.SUBTRACT)


solid = part.part
